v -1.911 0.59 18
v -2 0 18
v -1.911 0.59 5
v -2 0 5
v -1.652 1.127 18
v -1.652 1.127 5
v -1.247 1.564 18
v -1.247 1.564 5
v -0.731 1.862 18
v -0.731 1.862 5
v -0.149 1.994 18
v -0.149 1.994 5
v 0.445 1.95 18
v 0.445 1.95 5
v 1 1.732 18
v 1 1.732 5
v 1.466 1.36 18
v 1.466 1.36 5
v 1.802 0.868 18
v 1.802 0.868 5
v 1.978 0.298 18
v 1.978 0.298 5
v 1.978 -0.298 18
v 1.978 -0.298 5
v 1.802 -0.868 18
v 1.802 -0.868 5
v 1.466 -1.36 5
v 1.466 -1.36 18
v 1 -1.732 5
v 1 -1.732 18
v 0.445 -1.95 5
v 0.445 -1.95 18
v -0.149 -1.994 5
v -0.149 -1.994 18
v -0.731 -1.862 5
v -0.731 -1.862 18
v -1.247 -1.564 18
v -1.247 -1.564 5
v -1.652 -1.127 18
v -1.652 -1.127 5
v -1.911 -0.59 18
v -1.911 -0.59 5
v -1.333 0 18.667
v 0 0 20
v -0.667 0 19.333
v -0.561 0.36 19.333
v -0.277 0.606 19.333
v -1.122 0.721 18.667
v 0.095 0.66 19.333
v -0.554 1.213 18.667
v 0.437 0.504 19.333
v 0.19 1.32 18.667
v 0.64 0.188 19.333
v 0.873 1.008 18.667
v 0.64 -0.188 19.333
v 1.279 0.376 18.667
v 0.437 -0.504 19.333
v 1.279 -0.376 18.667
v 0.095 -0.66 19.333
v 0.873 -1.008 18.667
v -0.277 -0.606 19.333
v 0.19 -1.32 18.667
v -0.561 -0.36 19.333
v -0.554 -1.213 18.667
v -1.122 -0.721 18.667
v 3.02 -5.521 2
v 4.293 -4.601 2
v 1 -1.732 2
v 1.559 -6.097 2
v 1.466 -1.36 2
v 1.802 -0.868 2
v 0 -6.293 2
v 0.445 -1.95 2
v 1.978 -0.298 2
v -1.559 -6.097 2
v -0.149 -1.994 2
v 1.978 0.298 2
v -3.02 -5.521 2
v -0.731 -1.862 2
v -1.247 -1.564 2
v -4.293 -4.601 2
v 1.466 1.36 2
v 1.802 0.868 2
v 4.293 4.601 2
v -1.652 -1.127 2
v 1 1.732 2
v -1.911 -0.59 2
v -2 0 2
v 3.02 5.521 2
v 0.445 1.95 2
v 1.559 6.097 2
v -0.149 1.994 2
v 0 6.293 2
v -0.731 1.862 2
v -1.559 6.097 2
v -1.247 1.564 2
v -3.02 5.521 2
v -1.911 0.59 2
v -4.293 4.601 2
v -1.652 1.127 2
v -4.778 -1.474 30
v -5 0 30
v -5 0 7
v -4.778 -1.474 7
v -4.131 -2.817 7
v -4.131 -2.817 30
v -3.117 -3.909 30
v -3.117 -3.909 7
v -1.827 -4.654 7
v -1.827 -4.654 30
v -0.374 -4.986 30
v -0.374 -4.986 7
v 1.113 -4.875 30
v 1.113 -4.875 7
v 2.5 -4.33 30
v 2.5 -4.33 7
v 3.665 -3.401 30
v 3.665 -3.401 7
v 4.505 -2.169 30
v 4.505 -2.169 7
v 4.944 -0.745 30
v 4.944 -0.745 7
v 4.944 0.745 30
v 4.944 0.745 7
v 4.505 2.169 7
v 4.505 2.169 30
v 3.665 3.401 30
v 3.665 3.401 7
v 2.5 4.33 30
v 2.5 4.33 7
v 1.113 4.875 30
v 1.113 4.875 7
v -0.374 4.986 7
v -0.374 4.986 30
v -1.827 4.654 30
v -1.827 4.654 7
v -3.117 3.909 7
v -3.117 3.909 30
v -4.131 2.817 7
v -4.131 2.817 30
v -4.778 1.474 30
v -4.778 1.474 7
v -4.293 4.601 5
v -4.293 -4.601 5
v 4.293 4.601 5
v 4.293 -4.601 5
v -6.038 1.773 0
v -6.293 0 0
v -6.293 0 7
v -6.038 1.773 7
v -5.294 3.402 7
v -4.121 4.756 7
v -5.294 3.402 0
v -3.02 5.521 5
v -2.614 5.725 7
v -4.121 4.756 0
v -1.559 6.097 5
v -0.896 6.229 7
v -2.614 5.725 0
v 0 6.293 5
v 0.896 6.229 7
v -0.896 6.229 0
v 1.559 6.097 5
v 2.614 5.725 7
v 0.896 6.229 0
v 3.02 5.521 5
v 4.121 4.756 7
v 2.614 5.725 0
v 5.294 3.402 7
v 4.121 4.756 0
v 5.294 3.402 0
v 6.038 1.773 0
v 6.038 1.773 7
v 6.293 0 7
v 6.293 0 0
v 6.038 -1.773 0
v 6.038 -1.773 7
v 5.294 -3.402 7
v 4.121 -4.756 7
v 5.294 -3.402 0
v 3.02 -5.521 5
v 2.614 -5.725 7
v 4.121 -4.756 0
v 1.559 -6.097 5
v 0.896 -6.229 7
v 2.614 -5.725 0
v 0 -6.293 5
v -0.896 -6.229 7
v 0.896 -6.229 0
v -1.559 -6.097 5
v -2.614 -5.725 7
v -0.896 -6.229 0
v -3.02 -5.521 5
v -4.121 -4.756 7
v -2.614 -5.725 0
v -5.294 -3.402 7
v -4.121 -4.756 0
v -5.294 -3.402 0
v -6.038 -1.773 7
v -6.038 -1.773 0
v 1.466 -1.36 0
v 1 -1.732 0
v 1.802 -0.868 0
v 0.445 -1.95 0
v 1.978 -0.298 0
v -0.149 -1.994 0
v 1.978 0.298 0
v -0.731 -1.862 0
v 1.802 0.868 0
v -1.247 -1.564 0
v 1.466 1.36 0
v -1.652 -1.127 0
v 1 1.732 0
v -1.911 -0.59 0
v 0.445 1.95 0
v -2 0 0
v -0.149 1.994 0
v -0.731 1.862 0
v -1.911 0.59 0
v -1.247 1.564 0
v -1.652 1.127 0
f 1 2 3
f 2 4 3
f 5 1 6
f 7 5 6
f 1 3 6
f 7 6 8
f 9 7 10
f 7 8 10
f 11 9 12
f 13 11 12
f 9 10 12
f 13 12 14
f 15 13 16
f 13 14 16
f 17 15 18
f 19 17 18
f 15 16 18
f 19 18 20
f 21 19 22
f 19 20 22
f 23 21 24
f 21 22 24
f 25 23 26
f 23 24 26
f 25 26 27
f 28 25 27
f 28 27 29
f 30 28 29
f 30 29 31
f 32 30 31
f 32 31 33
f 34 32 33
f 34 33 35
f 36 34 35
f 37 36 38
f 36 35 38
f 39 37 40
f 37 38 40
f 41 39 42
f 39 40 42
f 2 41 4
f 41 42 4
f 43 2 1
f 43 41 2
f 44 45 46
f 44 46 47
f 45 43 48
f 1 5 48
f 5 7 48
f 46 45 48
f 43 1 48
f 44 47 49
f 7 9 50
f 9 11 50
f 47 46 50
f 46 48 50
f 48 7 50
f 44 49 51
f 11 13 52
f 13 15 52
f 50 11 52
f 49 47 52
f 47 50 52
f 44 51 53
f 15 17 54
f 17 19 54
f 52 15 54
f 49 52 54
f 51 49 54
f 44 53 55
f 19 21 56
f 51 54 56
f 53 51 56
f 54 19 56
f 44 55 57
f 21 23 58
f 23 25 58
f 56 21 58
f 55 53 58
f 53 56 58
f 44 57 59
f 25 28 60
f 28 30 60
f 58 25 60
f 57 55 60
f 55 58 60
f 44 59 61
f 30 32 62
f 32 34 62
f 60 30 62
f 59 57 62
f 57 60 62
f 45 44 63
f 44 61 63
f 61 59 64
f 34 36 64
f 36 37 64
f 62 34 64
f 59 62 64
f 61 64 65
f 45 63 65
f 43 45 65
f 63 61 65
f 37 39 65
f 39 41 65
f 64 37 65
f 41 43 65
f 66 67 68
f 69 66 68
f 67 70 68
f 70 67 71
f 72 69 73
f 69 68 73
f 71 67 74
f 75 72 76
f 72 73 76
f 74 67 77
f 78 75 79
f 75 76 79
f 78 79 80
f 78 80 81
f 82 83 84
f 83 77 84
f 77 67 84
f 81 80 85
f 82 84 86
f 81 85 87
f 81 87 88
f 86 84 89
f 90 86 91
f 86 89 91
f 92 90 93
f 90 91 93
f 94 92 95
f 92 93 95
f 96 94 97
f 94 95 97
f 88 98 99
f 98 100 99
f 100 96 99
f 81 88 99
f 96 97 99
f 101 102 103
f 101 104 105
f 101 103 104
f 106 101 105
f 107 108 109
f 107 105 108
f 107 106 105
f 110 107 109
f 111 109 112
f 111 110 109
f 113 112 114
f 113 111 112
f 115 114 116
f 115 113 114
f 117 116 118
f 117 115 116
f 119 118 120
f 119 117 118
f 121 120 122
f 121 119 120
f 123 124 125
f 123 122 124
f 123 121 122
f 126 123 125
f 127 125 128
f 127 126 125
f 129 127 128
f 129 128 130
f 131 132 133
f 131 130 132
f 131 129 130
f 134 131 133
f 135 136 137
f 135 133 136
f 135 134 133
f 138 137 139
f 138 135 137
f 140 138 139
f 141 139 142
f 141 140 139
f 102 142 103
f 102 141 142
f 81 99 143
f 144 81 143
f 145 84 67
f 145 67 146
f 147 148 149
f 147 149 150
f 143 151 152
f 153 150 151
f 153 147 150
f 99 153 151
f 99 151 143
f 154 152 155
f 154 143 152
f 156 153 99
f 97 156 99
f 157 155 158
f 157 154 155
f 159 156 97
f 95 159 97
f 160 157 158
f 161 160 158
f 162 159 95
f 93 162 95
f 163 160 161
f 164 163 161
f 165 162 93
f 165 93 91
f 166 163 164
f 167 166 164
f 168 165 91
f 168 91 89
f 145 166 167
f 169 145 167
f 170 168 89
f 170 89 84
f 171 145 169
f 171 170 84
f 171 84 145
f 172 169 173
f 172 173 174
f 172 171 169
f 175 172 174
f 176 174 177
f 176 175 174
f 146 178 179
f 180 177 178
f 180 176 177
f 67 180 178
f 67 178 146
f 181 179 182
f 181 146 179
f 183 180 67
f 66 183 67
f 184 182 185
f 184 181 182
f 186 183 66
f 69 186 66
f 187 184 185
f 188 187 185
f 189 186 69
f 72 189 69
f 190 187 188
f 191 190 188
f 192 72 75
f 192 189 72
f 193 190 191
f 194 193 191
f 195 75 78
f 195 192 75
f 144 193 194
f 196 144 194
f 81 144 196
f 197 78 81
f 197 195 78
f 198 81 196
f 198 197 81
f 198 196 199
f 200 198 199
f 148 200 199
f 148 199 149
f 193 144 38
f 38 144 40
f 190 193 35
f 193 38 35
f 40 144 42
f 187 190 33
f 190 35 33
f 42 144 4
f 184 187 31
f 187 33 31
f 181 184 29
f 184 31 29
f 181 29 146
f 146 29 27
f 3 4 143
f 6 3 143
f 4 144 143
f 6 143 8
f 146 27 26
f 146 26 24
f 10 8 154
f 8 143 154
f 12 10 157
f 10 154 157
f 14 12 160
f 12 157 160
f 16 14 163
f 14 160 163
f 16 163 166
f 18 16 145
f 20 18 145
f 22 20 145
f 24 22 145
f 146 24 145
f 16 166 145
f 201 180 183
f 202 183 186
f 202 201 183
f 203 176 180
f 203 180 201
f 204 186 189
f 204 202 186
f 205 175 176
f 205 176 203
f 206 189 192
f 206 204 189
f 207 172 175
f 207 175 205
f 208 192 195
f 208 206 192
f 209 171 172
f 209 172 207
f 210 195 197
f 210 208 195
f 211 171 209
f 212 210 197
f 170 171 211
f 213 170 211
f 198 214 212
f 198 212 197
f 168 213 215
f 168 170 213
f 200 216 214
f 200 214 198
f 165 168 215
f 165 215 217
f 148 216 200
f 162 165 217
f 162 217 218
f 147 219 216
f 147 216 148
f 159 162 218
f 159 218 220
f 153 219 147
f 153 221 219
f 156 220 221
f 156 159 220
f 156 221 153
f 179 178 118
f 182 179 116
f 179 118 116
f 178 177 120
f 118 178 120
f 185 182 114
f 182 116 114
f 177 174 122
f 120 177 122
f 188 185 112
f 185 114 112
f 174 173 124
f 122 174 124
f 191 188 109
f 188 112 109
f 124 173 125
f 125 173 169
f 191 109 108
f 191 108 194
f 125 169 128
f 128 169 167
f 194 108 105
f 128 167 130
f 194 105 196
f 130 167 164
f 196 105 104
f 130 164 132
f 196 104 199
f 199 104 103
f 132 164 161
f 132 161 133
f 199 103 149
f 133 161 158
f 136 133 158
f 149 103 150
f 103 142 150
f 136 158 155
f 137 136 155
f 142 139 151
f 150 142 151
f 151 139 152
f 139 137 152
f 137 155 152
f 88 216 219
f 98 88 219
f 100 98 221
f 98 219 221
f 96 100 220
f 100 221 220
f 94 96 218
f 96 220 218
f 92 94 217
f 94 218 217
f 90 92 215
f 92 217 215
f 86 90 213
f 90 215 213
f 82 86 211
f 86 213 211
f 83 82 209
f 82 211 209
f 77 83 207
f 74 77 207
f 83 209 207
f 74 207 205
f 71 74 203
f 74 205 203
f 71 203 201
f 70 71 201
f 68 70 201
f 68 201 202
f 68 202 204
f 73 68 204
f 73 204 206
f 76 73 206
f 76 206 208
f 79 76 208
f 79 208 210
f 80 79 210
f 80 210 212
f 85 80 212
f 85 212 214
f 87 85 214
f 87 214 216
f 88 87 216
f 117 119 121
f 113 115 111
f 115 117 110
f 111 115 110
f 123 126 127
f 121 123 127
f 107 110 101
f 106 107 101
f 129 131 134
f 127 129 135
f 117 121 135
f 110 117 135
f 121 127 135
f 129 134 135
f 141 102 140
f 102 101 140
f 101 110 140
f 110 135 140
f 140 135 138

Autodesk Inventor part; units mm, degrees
ref_plane "YZ Plane" through (0, 0, 0) normal (1, 0, 0) x (0, 1, 0)
ref_plane "XZ Plane" through (0, 0, 0) normal (0, 1, 0) x (-1, 0, 0)
ref_plane "XY Plane" through (0, 0, 0) normal (0, 0, 1) x (1, 0, 0)
sketch "Boceto1" plane through (0, 0, 0) normal (0, 0, 1) x (1, 0, 0)
  circle A0 centre (0, 0) radius 8.9
  line L0 (6.2933, -6.2933) -> (-6.2933, -6.2933)
  line L1 (-6.2933, -6.2933) -> (-6.2933, 6.2933)
  line L2 (-6.2933, 6.2933) -> (6.2933, 6.2933)
  line L3 (6.2933, 6.2933) -> (6.2933, -6.2933)
  dimension "d0" = 17.8
  dimension "d1" = 12.5865
  dimension "d2" = 12.5865
sketch "Boceto2" plane through (0, 0, 0) normal (0, 1, 0) x (-1, 0, 0)
  line L0 (6.2933, 0) -> (-6.2933, 0)
  line L1 (-6.2933, 0) -> (-6.2933, 2)
  line L2 (-6.2933, 2) -> (6.2933, 2)
  line L3 (6.2933, 2) -> (6.2933, 0)
  line L4 (-6.2933, 0) -> (6.2933, 0)
  line L5 (6.2933, 0) -> (4.2933, 0)
  line L6 (4.2933, 0) -> (4.2933, 7)
  line L7 (4.2933, 7) -> (6.2933, 7)
  line L8 (6.2933, 7) -> (6.2933, 0)
  line L9 (-6.2933, 0) -> (-4.2933, 0)
  line L10 (-4.2933, 0) -> (-4.2933, 7)
  line L11 (-4.2933, 7) -> (-6.2933, 7)
  line L12 (-6.2933, 7) -> (-6.2933, 0)
  line L13 (-6.2933, 7) -> (6.2933, 7)
  line L14 (6.2933, 7) -> (6.2933, 5)
  line L15 (6.2933, 5) -> (-6.2933, 5)
  line L16 (-6.2933, 5) -> (-6.2933, 7)
  line L17 (0, 7) -> (5, 7)
  line L18 (5, 7) -> (5, 30)
  line L19 (5, 30) -> (0, 30)
  line L20 (0, 30) -> (0, 7)
  line L21 (0, 7) -> (0, 0)
  point P0 (6.2933, 10)
  point P1 (6.2933, 15)
  point P2 (6.2933, 20)
  point P3 (6.2933, 25)
  point P4 (6.2933, 30)
  point P5 (4.2933, 2)
  point P6 (-4.2933, 2)
  point P7 (0, 5)
  point P8 (4.2933, 5)
  point P9 (0, 2)
  point P10 (-4.2933, 5)
  dimension "d5" = 2
  dimension "d28" = 2
  dimension "d29" = 5
  dimension "d30" = 23
revolve "Revolución1" add sketch "Boceto2" angle 360 about axis through (0, 0, 7) along (0, 0, -1) contours L0 L6 L2 L3 | L0 L21 L2 L6 | L2 L6 L15 L8 | L15 L6 L7 L8 | L15 L21 L13 L6 | L13 L20 L19 L18 L7
extrude "Extrusión4" cut sketch "Boceto2" against normal mid plane 20 contours L2 L21 L15 L6 | L2 L10 L15 L21
sketch "Boceto4" plane through (0, 0, 0) normal (0, 0, -1) x (-1, 0, 0)
  circle A0 centre (0, 0) radius 2
  dimension "d34" = 4
extrude "Extrusión5" cut sketch "Boceto4" against normal blind 20
chamfer "Chaflán1" distance 2 angle 45 1 edges at (2, 0, 20)
properties part number "_3DPrint"
